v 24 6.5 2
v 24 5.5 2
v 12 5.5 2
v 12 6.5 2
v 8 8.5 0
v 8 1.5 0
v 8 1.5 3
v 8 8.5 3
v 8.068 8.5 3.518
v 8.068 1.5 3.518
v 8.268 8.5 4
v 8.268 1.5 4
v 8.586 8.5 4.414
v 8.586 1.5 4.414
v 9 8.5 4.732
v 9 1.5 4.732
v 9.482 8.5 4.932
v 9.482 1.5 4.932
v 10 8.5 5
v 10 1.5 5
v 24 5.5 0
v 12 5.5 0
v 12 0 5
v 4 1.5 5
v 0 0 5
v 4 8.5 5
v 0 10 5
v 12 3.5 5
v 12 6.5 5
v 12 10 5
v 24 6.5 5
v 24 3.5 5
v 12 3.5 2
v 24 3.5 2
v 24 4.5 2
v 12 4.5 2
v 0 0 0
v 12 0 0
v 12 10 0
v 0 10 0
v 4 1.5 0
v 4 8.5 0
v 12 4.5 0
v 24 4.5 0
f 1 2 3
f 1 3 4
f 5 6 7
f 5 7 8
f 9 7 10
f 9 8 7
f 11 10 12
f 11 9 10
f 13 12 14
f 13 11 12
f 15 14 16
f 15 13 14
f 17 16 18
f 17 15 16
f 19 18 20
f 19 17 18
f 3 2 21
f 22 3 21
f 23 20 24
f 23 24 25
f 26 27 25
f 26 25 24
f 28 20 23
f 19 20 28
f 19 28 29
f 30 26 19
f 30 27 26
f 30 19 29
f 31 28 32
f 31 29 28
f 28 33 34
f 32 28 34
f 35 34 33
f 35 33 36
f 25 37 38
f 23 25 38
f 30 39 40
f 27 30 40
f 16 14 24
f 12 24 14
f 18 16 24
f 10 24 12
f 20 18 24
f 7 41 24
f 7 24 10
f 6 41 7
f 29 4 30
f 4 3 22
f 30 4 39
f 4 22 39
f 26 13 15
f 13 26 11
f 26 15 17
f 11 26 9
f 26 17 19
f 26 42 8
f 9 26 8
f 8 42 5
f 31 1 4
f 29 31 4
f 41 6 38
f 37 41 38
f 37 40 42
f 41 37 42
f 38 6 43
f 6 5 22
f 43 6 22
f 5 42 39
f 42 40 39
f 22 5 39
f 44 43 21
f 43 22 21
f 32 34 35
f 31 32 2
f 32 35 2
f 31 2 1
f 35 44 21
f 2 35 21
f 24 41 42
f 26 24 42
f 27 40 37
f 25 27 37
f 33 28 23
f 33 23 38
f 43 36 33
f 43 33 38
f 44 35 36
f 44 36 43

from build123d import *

# Parameters (mm, degrees)
ESBO_O1_W                = 4
ESBO_O1_H                = 7
RESSALTO_EXTRUS_O1_DEPTH = 5
FILETE1_R                = 2
ESBO_O4_W                = 2
ESBO_O4_H                = 1
CORTE_EXTRUS_O2_DEPTH    = 12


with BuildPart() as part:
    # Esboço1 → Ressalto-extrusão1 (new body)
    with BuildSketch(Plane.XY):
        Polygon((24, 3.5), (24, 6.5), (12, 6.5), (12, 10), (0, 10), (0, 0), (12, 0), (12, 3.5), align=None)
        with Locations((6, 5)):
            Rectangle(ESBO_O1_W, ESBO_O1_H, mode=Mode.SUBTRACT)
    extrude(amount=RESSALTO_EXTRUS_O1_DEPTH)

    # Filete1
    filete1_edges = [part.edges().sort_by_distance(p)[0] for p in [
        (8, 5, 5),
    ]]
    fillet(filete1_edges, radius=FILETE1_R)

    # Esboço4 → Corte-extrusão2 (cut)
    with BuildSketch(Plane(origin=(24, 0, 0), x_dir=(0, 0, -1), z_dir=(1, 0, 0))):
        with Locations((-1, 4)):
            Rectangle(ESBO_O4_W, ESBO_O4_H)
        with Locations((-1, 6)):
            Rectangle(ESBO_O4_W, ESBO_O4_H)
    extrude(amount=-CORTE_EXTRUS_O2_DEPTH, mode=Mode.SUBTRACT)


solid = part.part
